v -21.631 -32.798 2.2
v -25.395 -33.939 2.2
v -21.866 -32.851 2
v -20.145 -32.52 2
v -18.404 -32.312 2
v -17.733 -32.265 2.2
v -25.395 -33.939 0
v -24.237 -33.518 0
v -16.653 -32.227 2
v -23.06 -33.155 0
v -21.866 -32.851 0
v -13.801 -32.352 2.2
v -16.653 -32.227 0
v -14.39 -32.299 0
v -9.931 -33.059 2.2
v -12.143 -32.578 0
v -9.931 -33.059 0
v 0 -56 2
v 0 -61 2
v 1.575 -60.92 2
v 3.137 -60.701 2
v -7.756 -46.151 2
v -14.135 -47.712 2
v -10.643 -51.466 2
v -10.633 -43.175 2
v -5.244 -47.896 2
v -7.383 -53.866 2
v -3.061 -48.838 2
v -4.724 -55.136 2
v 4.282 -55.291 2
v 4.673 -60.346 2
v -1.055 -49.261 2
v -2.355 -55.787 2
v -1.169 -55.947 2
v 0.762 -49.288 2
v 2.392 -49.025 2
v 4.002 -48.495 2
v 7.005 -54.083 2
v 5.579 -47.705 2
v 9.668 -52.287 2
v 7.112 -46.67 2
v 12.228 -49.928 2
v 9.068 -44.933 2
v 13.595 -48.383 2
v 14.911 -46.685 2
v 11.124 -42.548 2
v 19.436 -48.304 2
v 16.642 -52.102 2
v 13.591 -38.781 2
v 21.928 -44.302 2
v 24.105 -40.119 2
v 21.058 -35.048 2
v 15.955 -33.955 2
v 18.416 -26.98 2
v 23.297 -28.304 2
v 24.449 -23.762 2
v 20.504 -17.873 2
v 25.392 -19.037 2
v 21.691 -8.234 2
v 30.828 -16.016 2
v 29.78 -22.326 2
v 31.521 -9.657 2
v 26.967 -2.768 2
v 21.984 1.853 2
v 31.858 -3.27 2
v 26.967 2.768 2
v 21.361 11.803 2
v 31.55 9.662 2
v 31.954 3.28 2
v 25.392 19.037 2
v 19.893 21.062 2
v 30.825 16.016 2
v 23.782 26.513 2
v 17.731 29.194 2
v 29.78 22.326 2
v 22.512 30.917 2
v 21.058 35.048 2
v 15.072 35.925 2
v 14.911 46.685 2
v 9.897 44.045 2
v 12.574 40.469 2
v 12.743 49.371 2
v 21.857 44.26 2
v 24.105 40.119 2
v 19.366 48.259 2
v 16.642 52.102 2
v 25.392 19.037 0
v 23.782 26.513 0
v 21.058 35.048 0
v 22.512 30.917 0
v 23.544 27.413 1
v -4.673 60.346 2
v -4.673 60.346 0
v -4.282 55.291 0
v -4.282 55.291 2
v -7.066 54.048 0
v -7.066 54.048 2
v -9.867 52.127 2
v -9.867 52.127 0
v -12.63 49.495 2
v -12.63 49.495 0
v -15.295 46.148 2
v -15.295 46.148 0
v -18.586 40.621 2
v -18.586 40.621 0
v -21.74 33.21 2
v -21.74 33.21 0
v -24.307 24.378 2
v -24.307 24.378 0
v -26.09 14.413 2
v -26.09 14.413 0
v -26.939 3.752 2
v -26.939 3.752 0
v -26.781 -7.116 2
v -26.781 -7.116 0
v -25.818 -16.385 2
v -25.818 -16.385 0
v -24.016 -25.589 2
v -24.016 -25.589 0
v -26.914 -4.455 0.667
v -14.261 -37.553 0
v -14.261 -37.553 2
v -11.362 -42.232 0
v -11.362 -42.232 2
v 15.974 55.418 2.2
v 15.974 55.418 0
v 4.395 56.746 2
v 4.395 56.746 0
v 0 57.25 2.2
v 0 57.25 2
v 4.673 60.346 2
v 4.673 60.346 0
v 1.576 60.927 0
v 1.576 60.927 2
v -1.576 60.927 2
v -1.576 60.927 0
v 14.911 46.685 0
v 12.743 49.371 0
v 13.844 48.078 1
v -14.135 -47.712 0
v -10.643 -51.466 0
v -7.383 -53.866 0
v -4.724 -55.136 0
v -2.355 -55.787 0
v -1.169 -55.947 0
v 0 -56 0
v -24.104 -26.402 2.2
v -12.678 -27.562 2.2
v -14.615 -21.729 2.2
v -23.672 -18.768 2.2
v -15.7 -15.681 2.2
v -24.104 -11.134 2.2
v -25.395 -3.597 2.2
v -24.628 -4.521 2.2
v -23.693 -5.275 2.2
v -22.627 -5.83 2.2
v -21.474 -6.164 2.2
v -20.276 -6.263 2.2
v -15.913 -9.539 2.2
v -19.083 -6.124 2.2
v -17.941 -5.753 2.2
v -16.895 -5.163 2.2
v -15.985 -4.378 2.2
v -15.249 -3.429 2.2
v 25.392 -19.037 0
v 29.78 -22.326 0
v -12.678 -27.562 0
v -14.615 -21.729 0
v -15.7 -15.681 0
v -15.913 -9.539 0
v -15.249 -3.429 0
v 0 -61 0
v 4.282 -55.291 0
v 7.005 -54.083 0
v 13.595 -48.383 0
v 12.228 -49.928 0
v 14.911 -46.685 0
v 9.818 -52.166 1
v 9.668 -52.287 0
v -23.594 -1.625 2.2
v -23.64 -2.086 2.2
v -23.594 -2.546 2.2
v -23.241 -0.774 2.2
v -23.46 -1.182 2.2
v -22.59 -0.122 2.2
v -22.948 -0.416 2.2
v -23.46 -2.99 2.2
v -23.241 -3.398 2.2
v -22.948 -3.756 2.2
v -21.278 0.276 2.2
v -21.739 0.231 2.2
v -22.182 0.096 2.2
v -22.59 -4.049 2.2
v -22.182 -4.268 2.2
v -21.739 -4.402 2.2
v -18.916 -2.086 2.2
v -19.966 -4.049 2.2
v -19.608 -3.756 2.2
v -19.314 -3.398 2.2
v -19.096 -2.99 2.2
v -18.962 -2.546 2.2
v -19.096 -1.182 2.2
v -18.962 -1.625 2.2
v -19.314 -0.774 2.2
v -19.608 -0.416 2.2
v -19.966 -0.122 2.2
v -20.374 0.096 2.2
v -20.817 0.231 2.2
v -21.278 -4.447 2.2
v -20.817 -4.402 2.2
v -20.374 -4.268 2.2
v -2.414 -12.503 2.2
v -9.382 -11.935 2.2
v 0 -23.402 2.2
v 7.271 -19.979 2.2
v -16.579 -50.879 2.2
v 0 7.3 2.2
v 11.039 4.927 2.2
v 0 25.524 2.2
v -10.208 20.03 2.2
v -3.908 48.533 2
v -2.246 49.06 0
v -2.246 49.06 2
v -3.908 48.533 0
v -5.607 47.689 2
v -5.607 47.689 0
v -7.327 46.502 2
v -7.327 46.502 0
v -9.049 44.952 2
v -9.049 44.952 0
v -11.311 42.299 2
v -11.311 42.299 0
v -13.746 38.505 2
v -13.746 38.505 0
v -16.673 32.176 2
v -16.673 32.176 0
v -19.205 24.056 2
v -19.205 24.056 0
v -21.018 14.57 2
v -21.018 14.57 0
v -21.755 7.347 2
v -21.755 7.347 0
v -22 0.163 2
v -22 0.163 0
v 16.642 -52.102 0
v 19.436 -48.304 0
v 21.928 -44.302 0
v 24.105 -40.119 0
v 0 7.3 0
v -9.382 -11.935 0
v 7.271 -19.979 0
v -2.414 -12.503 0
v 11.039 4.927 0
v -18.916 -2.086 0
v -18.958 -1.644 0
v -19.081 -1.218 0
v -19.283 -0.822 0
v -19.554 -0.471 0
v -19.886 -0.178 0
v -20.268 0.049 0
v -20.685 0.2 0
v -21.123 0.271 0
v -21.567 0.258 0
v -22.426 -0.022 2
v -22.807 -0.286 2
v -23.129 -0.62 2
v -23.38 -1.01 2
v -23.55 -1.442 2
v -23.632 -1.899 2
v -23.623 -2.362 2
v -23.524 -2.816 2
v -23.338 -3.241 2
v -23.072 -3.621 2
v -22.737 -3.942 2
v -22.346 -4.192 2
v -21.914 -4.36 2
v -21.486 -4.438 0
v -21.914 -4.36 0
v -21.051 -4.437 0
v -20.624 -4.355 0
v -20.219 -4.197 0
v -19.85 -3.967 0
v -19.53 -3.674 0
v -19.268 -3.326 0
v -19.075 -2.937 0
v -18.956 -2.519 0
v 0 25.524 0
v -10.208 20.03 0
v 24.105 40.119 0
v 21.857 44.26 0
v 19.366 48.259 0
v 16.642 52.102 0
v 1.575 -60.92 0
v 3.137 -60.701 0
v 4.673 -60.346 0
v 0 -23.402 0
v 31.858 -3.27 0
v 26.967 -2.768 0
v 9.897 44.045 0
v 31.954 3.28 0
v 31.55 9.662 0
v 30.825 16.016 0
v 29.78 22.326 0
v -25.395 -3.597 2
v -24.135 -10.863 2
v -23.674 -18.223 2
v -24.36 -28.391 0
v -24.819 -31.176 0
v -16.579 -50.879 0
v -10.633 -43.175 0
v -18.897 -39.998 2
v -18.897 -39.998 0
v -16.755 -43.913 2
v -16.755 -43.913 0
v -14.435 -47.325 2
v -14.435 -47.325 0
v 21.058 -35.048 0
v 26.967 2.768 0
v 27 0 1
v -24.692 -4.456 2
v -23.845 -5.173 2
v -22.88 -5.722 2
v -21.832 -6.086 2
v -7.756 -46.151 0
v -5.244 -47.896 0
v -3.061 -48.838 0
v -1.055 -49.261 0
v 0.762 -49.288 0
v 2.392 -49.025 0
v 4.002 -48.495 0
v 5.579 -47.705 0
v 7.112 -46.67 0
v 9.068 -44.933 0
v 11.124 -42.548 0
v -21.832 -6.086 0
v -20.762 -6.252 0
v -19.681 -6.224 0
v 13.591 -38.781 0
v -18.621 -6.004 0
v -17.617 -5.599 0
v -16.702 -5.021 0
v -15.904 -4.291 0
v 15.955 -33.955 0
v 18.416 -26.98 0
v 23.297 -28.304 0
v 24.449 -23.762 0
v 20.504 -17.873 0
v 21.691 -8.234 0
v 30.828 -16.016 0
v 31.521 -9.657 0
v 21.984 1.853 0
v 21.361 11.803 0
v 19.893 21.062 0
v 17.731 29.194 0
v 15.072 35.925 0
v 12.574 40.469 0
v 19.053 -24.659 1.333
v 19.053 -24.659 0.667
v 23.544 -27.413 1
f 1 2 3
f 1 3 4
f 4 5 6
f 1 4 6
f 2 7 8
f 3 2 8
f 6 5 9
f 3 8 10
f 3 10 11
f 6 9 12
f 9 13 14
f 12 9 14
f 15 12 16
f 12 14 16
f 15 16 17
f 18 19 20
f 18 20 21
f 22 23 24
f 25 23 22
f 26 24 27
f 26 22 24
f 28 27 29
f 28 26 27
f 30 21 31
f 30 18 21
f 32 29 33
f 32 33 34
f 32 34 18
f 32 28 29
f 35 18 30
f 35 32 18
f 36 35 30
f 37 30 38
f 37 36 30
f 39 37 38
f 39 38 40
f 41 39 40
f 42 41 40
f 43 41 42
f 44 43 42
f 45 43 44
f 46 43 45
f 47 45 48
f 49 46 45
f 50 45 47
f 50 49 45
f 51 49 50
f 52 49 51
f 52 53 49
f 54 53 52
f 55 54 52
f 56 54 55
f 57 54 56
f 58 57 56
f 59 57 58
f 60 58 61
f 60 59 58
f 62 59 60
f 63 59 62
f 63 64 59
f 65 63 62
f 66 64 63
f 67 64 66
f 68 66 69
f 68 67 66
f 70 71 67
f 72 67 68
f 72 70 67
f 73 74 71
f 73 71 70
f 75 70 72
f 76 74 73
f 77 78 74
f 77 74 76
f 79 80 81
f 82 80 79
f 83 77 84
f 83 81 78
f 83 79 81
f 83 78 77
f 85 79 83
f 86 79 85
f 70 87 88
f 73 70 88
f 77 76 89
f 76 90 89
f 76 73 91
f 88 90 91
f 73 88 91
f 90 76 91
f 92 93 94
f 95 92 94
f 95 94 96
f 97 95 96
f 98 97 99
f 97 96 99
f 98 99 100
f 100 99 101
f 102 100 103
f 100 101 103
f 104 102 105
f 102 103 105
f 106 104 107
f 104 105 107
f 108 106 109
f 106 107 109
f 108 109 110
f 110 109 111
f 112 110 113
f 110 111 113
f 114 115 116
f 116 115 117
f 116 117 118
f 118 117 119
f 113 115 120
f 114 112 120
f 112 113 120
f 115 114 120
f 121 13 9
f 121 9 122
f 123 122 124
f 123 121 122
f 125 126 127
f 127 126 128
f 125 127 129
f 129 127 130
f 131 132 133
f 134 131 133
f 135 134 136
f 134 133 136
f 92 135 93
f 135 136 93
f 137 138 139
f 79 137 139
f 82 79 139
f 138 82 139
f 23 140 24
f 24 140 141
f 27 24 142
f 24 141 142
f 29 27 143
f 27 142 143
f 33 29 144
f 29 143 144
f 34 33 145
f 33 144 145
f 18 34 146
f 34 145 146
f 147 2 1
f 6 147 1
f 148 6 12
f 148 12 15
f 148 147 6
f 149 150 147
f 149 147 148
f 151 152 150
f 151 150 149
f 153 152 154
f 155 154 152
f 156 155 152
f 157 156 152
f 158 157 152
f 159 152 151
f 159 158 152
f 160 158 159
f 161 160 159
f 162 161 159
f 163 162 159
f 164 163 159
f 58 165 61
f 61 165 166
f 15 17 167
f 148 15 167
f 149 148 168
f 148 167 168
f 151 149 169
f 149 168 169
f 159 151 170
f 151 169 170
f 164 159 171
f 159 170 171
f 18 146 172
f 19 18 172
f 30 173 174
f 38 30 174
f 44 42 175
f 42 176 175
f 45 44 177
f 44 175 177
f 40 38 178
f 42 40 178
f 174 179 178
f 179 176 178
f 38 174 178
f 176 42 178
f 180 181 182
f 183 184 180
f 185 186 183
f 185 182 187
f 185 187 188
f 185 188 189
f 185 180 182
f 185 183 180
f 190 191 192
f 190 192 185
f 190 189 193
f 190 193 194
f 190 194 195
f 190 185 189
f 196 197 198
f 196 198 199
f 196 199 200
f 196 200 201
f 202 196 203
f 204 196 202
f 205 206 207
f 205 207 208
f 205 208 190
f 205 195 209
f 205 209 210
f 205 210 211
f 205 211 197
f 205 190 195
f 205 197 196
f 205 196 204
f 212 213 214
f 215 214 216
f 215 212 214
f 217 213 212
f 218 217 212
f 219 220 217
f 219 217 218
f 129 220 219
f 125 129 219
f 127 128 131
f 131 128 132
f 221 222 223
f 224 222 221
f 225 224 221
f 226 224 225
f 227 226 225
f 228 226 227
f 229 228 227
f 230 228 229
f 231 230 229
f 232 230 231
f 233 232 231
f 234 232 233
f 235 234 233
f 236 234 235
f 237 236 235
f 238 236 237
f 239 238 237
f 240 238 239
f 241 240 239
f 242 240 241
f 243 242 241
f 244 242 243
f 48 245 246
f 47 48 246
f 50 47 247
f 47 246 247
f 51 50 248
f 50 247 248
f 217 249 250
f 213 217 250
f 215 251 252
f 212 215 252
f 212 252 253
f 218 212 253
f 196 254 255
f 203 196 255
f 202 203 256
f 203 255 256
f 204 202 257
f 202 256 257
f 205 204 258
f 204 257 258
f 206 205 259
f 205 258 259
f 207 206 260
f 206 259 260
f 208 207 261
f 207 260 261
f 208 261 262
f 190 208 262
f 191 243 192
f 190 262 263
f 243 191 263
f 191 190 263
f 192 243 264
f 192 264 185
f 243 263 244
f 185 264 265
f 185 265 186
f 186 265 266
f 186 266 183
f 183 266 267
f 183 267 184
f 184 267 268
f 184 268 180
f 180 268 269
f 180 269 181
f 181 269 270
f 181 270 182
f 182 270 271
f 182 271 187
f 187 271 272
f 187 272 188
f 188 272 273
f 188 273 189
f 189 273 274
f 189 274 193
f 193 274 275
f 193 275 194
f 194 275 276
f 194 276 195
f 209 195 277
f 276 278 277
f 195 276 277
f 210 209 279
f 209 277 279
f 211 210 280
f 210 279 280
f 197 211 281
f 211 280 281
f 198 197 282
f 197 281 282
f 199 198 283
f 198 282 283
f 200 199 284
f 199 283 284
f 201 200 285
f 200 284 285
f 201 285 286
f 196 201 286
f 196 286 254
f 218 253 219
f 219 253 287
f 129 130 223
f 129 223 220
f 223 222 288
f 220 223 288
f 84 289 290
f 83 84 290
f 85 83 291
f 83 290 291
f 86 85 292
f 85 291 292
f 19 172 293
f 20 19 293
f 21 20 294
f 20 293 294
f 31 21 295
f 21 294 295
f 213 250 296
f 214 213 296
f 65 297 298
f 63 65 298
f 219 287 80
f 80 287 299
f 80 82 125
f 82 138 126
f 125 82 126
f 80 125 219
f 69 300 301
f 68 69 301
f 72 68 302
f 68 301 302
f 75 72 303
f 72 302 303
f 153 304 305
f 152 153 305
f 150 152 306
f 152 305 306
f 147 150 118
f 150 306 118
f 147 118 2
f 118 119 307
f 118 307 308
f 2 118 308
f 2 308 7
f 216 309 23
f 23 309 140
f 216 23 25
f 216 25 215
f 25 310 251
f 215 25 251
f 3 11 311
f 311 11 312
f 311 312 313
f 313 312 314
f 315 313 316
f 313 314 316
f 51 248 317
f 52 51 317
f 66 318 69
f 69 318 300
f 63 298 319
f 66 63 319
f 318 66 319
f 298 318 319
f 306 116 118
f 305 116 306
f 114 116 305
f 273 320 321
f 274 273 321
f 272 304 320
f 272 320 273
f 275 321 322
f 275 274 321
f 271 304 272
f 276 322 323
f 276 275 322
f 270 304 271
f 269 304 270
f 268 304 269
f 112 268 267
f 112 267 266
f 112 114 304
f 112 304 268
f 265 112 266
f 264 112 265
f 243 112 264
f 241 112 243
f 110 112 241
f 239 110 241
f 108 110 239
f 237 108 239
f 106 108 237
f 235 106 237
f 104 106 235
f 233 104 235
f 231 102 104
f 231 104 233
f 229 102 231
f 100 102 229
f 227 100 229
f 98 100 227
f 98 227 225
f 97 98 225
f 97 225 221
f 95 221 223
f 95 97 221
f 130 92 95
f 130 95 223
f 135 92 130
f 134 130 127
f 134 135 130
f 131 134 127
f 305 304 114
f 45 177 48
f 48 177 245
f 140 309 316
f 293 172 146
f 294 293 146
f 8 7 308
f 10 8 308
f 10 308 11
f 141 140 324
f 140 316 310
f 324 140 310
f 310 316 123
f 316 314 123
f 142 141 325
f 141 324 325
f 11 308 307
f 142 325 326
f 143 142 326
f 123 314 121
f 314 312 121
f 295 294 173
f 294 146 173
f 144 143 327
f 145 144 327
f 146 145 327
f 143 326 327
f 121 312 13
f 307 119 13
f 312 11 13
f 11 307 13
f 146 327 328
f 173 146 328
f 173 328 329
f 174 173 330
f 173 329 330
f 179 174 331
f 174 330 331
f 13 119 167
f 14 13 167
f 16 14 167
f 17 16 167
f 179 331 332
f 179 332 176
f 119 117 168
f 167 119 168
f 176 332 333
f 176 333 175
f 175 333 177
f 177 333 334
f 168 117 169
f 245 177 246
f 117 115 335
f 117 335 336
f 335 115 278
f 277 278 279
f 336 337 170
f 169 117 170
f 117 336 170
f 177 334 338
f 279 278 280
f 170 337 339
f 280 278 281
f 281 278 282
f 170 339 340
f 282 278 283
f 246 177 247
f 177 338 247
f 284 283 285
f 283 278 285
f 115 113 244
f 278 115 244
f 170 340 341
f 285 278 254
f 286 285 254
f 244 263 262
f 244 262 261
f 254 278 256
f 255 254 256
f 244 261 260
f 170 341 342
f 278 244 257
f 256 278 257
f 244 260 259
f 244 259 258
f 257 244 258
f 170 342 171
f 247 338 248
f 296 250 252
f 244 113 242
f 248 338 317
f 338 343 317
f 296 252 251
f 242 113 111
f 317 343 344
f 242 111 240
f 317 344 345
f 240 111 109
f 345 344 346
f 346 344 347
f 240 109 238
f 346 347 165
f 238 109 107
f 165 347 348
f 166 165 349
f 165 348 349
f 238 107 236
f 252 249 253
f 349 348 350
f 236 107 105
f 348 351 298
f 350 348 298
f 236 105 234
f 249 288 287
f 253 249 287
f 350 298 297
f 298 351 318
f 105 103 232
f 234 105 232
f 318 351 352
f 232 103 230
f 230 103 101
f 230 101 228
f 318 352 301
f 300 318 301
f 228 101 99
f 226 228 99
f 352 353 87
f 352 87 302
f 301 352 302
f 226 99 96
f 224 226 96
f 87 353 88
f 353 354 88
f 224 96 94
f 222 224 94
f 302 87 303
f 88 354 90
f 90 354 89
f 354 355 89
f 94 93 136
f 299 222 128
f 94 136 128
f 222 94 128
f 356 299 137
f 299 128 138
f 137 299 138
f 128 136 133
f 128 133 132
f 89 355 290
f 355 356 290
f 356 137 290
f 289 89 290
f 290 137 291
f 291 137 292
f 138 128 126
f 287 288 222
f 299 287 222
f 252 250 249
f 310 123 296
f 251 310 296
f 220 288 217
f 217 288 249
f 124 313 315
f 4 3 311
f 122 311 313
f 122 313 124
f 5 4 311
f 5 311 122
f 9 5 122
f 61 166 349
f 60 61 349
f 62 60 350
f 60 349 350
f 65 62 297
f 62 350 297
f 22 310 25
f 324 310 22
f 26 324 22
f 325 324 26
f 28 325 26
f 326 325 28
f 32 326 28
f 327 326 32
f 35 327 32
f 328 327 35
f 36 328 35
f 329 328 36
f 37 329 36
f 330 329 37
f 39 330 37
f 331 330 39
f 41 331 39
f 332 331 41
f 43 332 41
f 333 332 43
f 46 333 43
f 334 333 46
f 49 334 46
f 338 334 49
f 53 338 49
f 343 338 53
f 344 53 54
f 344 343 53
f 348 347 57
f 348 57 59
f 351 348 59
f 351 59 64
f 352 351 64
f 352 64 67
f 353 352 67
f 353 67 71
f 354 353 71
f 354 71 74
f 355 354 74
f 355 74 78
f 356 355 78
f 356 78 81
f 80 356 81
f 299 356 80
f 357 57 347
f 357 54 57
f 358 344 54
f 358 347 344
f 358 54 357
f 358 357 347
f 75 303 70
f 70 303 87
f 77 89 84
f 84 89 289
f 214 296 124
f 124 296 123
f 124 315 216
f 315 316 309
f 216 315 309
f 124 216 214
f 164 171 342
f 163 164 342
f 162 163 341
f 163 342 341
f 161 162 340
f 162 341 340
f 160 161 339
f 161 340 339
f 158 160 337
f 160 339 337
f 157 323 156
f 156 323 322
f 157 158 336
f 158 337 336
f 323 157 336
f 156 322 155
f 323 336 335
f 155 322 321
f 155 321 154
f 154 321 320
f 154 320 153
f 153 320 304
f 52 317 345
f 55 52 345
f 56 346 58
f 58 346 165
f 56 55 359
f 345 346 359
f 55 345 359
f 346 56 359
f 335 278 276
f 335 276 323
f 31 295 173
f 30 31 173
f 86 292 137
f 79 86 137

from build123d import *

# Parameters (mm, degrees)
F1_DEPTH = 2
F3_DEPTH = 2.2
F5_DEPTH = 2.2
F6_R     = 2.3616524039
F7_DEPTH = 2.2


with BuildPart() as f1:
    # F0 (on Top) → F1 (new body)
    with BuildSketch(Plane.XY):
        with BuildLine():
            add(Edge.make_bspline(
                [(4.2820115549, 55.2912662544), (2.1546402979, 56), (0, 56)],
                knots=[6.1239198322, 6.1239198322, 6.1239198322, 6.2831853072, 6.2831853072, 6.2831853072], degree=2, weights=[1, 0.9968309887, 1]))
            add(Edge.make_bspline(
                [(0, 56), (-2.1546402979, 56), (-4.2820115549, 55.2912662544)],
                knots=[0, 0, 0, 0.159265475, 0.159265475, 0.159265475], degree=2, weights=[1, 0.9968309887, 1]))
            add(Edge.make_bspline(
                [(-4.2820115549, 55.2912662544), (-28.8976783734, 47.0905567232), (-26.9144366962, -4.4547216384), (-24.931195019, -56), (0, -56)],
                knots=[0.159265475, 0.159265475, 0.159265475, 1.6504290643, 1.6504290643, 3.1415926536, 3.1415926536, 3.1415926536], degree=2, weights=[1, 0.7346933376, 1, 0.7346933376, 1]))
            add(Edge.make_bspline(
                [(0, -56), (2.1546402979, -56), (4.2820115549, -55.2912662544)],
                knots=[3.1415926536, 3.1415926536, 3.1415926536, 3.3008581286, 3.3008581286, 3.3008581286], degree=2, weights=[1, 0.9968309887, 1]))
            add(Edge.make_bspline(
                [(4.2820115549, -55.2912662544), (10.0452188041, -53.3712537288), (14.9113782006, -46.6851361055)],
                knots=[3.3008581286, 3.3008581286, 3.3008581286, 3.7266812771, 3.7266812771, 3.7266812771], degree=2, weights=[1, 0.9774198236, 1]))
            add(Edge.make_bspline(
                [(14.9113782006, -46.6851361055), (18.4223704023, -41.8610222774), (21.0582047409, -35.0482934124)],
                knots=[3.7266812771, 3.7266812771, 3.7266812771, 4.0361522247, 4.0361522247, 4.0361522247], degree=2, weights=[1, 0.9880523338, 1]))
            add(Edge.make_bspline(
                [(21.0582047409, -35.0482934124), (23.8666639687, -27.7893883413), (25.3920853965, -19.0365654052)],
                knots=[4.0361522247, 4.0361522247, 4.0361522247, 4.3655372994, 4.3655372994, 4.3655372994], degree=2, weights=[1, 0.9864688102, 1]))
            add(Edge.make_bspline(
                [(25.3920853965, -19.0365654052), (26.7670823669, -11.1468735466), (26.9670008476, -2.767832451)],
                knots=[4.3655372994, 4.3655372994, 4.3655372994, 4.6629432552, 4.6629432552, 4.6629432552], degree=2, weights=[1, 0.9889640708, 1]))
            add(Edge.make_bspline(
                [(26.9670008476, -2.767832451), (27.033039533, 0), (26.9670008476, 2.767832451)],
                knots=[4.6629432552, 4.6629432552, 4.6629432552, 4.7618347055, 4.7618347055, 4.7618347055], degree=2, weights=[1, 0.9987778092, 1]))
            add(Edge.make_bspline(
                [(26.9670008476, 2.767832451), (26.7670823669, 11.1468735466), (25.3920853965, 19.0365654052)],
                knots=[4.7618347055, 4.7618347055, 4.7618347055, 5.0592406613, 5.0592406613, 5.0592406613], degree=2, weights=[1, 0.9889640708, 1]))
            add(Edge.make_bspline(
                [(25.3920853965, 19.0365654052), (23.8666639687, 27.7893883413), (21.0582047409, 35.0482934124)],
                knots=[5.0592406613, 5.0592406613, 5.0592406613, 5.3886257361, 5.3886257361, 5.3886257361], degree=2, weights=[1, 0.9864688102, 1]))
            add(Edge.make_bspline(
                [(21.0582047409, 35.0482934124), (18.4223704023, 41.8610222774), (14.9113782006, 46.6851361055)],
                knots=[5.3886257361, 5.3886257361, 5.3886257361, 5.6980966836, 5.6980966836, 5.6980966836], degree=2, weights=[1, 0.9880523338, 1]))
            add(Edge.make_bspline(
                [(14.9113782006, 46.6851361055), (10.0452188041, 53.3712537288), (4.2820115549, 55.2912662544)],
                knots=[5.6980966836, 5.6980966836, 5.6980966836, 6.1239198322, 6.1239198322, 6.1239198322], degree=2, weights=[1, 0.9774198236, 1]))
        make_face()
        with BuildLine():
            add(Edge.make_bspline(
                [(0, 49.3173897266), (-38.1051177665, 49.3173897266), (-19.0525588833, -24.6586948633), (0, -98.6347794533), (19.0525588833, -24.6586948633), (38.1051177665, 49.3173897266), (0, 49.3173897266)],
                knots=[0, 0, 0, 2.0943951024, 2.0943951024, 4.1887902048, 4.1887902048, 6.2831853072, 6.2831853072, 6.2831853072], degree=2, weights=[1, 0.5, 1, 0.5, 1, 0.5, 1]))
        make_face(mode=Mode.SUBTRACT)
        with BuildLine():
            add(Edge.make_bspline(
                [(0, -56), (2.1546402979, -56), (4.2820115549, -55.2912662544)],
                knots=[3.1415926536, 3.1415926536, 3.1415926536, 3.3008581286, 3.3008581286, 3.3008581286], degree=2, weights=[1, 0.9968309887, 1]))
            Line((0, -56), (0, -61))
            ThreePointArc((0, -61), (2.3583873908, -60.8276903053), (4.6734693903, -60.345946544))
            Line((4.6734693903, -60.345946544), (4.2820115549, -55.2912662544))
        make_face()
        with BuildLine():
            add(Edge.make_bspline(
                [(14.9113782006, -46.6851361055), (18.4223704023, -41.8610222774), (21.0582047409, -35.0482934124)],
                knots=[3.7266812771, 3.7266812771, 3.7266812771, 4.0361522247, 4.0361522247, 4.0361522247], degree=2, weights=[1, 0.9880523338, 1]))
            Line((14.9113782006, -46.6851361055), (16.6416236785, -52.1022574839))
            ThreePointArc((16.6416236785, -52.1022574839), (20.7207231207, -46.3271815431), (24.1050969797, -40.1193986891))
            Line((24.1050969797, -40.1193986891), (21.0582047409, -35.0482934124))
        make_face()
        with BuildLine():
            add(Edge.make_bspline(
                [(25.3920853965, -19.0365654052), (26.7670823669, -11.1468735466), (26.9670008476, -2.767832451)],
                knots=[4.3655372994, 4.3655372994, 4.3655372994, 4.6629432552, 4.6629432552, 4.6629432552], degree=2, weights=[1, 0.9889640708, 1]))
            Line((25.3920853965, -19.0365654052), (29.7796819968, -22.3259671361))
            ThreePointArc((29.7796819968, -22.3259671361), (31.2186902192, -12.8415061265), (31.8578340598, -3.2698165965))
            Line((31.8578340598, -3.2698165965), (26.9670008476, -2.767832451))
        make_face()
        with BuildLine():
            Line((29.7796819968, 22.3259671361), (25.3920853965, 19.0365654052))
            add(Edge.make_bspline(
                [(26.9670008476, 2.767832451), (26.7670823669, 11.1468735466), (25.3920853965, 19.0365654052)],
                knots=[4.7618347055, 4.7618347055, 4.7618347055, 5.0592406613, 5.0592406613, 5.0592406613], degree=2, weights=[1, 0.9889640708, 1]))
            Line((26.9670008476, 2.767832451), (31.9537159303, 3.2796576965))
            ThreePointArc((31.9537159303, 3.2796576965), (31.2274638186, 12.843991787), (29.7796819968, 22.3259671361))
        make_face()
        with BuildLine():
            Line((16.6416236785, 52.1022574839), (14.9113782006, 46.6851361055))
            add(Edge.make_bspline(
                [(21.0582047409, 35.0482934124), (18.4223704023, 41.8610222774), (14.9113782006, 46.6851361055)],
                knots=[5.3886257361, 5.3886257361, 5.3886257361, 5.6980966836, 5.6980966836, 5.6980966836], degree=2, weights=[1, 0.9880523338, 1]))
            Line((21.0582047409, 35.0482934124), (24.1050969797, 40.1193986891))
            ThreePointArc((24.1050969797, 40.1193986891), (20.6415785097, 46.2778866544), (16.6416236785, 52.1022574839))
        make_face()
        with BuildLine():
            add(Edge.make_bspline(
                [(0, 56), (-2.1546402979, 56), (-4.2820115549, 55.2912662544)],
                knots=[0, 0, 0, 0.159265475, 0.159265475, 0.159265475], degree=2, weights=[1, 0.9968309887, 1]))
            add(Edge.make_bspline(
                [(4.2820115549, 55.2912662544), (2.1546402979, 56), (0, 56)],
                knots=[6.1239198322, 6.1239198322, 6.1239198322, 6.2831853072, 6.2831853072, 6.2831853072], degree=2, weights=[1, 0.9968309887, 1]))
            Line((4.2820115549, 55.2912662544), (4.6734693903, 60.345946544))
            ThreePointArc((4.6734693903, 60.345946544), (0, 61), (-4.6734693903, 60.345946544))
            Line((-4.6734693903, 60.345946544), (-4.2820115549, 55.2912662544))
        make_face()
    extrude(amount=F1_DEPTH)

    # F2 (on Top) → F3 (join)
    with BuildSketch(Plane.XY):
        Polygon((15.9741807729, 55.4183572531), (0, 57.2495348752), (-10.208260268, 20.0303625315), (0, 7.2995228693), (-9.3816425651, -11.934582144), (0, -23.4015248716), (-16.5793877095, -50.8787333965), (7.2708860971, -19.9790354818), (-2.4143287039, -12.5033952501), (11.0392279875, 4.9266284475), (0, 25.5239494145), align=None)
    extrude(amount=F3_DEPTH)

    # F4 (on Top) → F5 (join)
    with BuildSketch(Plane.XY):
        with BuildLine():
            ThreePointArc((-15.2487736195, -3.4292829223), (-20.2764970946, -6.2630149339), (-25.3951884806, -3.5971119069))
            ThreePointArc((-25.3951884806, -3.5971119069), (-23.6715361959, -18.7681510579), (-25.3951884806, -33.9391902089))
            ThreePointArc((-25.3951884806, -33.9391902089), (-17.7333609068, -32.264536184), (-9.930992499, -33.058963716))
            ThreePointArc((-9.930992499, -33.058963716), (-15.2655383761, -18.7243360298), (-15.2487736195, -3.4292829223))
        make_face()
    extrude(amount=F5_DEPTH)

    # F6 (on Top) → F7 (join)
    with BuildSketch(Plane.XY):
        with Locations((-21.2778560817, -2.0857616328)):
            Circle(F6_R)
    extrude(amount=F7_DEPTH)


solid = f1.part
